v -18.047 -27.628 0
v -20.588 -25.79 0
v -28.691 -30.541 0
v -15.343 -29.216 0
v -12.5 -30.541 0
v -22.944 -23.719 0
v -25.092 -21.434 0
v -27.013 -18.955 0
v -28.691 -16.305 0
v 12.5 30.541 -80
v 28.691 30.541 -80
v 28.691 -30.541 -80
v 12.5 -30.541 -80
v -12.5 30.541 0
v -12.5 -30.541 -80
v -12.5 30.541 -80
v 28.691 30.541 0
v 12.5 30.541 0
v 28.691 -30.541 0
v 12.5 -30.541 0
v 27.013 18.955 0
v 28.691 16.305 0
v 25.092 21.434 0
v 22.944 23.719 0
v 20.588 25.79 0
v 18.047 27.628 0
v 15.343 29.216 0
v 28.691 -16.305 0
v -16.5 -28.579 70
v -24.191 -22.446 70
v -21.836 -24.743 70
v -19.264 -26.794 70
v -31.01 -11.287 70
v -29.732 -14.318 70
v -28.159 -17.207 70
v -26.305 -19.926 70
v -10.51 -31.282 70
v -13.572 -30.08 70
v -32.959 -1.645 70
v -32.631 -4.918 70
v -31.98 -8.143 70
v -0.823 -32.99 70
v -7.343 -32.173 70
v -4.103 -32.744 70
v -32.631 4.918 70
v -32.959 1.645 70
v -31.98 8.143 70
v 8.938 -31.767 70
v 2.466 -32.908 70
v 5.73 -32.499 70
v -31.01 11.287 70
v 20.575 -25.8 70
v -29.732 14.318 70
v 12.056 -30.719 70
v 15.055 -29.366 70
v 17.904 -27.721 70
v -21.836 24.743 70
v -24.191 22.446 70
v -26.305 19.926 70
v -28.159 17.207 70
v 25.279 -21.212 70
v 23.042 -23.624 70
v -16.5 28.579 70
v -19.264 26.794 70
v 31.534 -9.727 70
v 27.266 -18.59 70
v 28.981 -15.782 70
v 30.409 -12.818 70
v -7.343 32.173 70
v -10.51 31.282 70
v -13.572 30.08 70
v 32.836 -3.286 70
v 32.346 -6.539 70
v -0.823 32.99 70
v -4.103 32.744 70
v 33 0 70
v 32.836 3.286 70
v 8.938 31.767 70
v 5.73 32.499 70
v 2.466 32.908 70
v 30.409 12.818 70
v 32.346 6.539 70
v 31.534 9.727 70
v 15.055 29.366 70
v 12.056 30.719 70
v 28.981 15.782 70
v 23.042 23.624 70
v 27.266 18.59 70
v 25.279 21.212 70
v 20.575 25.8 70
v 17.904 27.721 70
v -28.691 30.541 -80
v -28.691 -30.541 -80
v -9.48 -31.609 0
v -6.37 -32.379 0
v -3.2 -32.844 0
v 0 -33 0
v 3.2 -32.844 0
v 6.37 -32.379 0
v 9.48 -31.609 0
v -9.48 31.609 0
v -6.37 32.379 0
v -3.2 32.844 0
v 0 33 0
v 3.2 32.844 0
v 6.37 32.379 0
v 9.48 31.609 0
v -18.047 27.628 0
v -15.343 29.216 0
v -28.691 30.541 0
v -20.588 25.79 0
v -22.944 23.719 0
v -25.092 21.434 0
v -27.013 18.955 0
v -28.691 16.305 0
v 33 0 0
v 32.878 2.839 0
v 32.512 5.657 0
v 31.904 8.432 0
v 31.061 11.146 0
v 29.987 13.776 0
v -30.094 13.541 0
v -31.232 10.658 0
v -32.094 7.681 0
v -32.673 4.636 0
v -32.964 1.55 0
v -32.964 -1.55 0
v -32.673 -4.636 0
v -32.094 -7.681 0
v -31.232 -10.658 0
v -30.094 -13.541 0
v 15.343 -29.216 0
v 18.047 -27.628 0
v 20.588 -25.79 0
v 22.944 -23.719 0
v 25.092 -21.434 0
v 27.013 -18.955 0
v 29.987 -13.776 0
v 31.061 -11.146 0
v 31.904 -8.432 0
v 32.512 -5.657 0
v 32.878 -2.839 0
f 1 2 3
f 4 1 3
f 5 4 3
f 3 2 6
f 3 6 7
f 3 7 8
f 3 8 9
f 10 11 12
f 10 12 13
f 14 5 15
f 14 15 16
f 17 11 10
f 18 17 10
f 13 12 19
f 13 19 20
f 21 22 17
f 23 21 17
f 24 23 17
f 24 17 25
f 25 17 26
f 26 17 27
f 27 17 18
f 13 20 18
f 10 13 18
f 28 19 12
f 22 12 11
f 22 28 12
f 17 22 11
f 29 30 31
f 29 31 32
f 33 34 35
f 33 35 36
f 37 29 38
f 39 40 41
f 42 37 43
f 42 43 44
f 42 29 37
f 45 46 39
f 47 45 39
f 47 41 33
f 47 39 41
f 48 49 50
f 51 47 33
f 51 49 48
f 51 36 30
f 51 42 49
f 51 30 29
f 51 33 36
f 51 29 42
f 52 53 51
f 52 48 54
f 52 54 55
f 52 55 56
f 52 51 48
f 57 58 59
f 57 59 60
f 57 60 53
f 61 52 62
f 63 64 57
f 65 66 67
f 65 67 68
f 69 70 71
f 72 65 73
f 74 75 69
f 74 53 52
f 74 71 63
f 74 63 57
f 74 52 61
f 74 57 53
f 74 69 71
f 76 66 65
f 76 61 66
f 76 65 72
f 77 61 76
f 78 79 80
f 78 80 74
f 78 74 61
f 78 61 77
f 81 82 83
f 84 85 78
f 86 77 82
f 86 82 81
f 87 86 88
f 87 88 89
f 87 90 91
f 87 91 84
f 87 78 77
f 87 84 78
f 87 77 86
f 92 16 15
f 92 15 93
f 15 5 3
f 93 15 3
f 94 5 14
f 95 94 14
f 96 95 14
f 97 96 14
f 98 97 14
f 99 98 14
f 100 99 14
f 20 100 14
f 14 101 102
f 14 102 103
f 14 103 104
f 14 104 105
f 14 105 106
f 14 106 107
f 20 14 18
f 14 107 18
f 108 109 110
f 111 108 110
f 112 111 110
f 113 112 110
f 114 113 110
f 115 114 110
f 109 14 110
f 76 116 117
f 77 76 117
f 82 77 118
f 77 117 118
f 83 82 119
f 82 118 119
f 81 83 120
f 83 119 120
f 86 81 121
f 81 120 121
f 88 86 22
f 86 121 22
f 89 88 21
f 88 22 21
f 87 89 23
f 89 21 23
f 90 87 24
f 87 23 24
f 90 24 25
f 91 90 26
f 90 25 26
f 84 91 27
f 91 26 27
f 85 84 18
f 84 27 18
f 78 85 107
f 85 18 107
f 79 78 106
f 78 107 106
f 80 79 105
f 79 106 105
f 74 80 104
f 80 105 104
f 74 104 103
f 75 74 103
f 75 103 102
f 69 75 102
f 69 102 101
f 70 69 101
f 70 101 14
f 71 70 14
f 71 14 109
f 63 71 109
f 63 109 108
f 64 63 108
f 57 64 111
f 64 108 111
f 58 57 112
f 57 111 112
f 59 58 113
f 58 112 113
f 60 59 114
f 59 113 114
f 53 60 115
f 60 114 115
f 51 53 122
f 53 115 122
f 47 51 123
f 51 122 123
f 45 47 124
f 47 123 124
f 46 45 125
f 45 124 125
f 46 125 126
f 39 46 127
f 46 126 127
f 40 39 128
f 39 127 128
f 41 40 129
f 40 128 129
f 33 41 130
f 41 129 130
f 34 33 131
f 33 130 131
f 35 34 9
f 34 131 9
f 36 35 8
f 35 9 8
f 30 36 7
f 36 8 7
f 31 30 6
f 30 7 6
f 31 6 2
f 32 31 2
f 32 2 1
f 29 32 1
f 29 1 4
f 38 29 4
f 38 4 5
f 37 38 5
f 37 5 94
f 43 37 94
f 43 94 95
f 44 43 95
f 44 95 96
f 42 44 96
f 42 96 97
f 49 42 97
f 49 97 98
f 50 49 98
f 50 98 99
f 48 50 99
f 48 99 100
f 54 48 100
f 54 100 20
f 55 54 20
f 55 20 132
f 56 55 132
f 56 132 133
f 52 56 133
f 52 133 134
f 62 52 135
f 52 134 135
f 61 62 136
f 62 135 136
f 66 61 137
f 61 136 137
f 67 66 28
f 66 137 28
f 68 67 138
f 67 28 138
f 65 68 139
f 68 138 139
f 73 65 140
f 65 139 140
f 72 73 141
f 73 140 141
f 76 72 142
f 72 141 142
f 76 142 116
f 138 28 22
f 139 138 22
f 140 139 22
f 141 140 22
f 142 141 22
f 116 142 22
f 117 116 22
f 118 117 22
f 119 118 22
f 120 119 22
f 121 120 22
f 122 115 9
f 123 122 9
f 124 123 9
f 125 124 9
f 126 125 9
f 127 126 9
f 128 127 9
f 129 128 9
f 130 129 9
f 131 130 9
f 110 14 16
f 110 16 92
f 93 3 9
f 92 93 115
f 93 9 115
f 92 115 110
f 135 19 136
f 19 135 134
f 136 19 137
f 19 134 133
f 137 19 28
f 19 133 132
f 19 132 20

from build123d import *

# Parameters (mm, degrees)
SKETCH_1_R      = 33
EXTRUDE_1_DEPTH = 70
SKETCH_2_W      = 16.190565304
SKETCH_2_H      = 61.081912216
EXTRUDE_3_DEPTH = 80


with BuildPart() as part:
    # 草图1 → 凸台-拉伸1 (new body)
    with BuildSketch(Plane.XY):
        Circle(SKETCH_1_R)
    extrude(amount=EXTRUDE_1_DEPTH)

    # 草图2 → 凸台-拉伸3 (add)
    with BuildSketch(Plane(origin=(0, 0, 0), x_dir=(-1, 0, 0), z_dir=(0, 0, -1))):
        with Locations((-20.595282652, 0)):
            Rectangle(SKETCH_2_W, SKETCH_2_H)
        with Locations((20.595282652, 0)):
            Rectangle(SKETCH_2_W, SKETCH_2_H)
    extrude(amount=EXTRUDE_3_DEPTH)


solid = part.part
